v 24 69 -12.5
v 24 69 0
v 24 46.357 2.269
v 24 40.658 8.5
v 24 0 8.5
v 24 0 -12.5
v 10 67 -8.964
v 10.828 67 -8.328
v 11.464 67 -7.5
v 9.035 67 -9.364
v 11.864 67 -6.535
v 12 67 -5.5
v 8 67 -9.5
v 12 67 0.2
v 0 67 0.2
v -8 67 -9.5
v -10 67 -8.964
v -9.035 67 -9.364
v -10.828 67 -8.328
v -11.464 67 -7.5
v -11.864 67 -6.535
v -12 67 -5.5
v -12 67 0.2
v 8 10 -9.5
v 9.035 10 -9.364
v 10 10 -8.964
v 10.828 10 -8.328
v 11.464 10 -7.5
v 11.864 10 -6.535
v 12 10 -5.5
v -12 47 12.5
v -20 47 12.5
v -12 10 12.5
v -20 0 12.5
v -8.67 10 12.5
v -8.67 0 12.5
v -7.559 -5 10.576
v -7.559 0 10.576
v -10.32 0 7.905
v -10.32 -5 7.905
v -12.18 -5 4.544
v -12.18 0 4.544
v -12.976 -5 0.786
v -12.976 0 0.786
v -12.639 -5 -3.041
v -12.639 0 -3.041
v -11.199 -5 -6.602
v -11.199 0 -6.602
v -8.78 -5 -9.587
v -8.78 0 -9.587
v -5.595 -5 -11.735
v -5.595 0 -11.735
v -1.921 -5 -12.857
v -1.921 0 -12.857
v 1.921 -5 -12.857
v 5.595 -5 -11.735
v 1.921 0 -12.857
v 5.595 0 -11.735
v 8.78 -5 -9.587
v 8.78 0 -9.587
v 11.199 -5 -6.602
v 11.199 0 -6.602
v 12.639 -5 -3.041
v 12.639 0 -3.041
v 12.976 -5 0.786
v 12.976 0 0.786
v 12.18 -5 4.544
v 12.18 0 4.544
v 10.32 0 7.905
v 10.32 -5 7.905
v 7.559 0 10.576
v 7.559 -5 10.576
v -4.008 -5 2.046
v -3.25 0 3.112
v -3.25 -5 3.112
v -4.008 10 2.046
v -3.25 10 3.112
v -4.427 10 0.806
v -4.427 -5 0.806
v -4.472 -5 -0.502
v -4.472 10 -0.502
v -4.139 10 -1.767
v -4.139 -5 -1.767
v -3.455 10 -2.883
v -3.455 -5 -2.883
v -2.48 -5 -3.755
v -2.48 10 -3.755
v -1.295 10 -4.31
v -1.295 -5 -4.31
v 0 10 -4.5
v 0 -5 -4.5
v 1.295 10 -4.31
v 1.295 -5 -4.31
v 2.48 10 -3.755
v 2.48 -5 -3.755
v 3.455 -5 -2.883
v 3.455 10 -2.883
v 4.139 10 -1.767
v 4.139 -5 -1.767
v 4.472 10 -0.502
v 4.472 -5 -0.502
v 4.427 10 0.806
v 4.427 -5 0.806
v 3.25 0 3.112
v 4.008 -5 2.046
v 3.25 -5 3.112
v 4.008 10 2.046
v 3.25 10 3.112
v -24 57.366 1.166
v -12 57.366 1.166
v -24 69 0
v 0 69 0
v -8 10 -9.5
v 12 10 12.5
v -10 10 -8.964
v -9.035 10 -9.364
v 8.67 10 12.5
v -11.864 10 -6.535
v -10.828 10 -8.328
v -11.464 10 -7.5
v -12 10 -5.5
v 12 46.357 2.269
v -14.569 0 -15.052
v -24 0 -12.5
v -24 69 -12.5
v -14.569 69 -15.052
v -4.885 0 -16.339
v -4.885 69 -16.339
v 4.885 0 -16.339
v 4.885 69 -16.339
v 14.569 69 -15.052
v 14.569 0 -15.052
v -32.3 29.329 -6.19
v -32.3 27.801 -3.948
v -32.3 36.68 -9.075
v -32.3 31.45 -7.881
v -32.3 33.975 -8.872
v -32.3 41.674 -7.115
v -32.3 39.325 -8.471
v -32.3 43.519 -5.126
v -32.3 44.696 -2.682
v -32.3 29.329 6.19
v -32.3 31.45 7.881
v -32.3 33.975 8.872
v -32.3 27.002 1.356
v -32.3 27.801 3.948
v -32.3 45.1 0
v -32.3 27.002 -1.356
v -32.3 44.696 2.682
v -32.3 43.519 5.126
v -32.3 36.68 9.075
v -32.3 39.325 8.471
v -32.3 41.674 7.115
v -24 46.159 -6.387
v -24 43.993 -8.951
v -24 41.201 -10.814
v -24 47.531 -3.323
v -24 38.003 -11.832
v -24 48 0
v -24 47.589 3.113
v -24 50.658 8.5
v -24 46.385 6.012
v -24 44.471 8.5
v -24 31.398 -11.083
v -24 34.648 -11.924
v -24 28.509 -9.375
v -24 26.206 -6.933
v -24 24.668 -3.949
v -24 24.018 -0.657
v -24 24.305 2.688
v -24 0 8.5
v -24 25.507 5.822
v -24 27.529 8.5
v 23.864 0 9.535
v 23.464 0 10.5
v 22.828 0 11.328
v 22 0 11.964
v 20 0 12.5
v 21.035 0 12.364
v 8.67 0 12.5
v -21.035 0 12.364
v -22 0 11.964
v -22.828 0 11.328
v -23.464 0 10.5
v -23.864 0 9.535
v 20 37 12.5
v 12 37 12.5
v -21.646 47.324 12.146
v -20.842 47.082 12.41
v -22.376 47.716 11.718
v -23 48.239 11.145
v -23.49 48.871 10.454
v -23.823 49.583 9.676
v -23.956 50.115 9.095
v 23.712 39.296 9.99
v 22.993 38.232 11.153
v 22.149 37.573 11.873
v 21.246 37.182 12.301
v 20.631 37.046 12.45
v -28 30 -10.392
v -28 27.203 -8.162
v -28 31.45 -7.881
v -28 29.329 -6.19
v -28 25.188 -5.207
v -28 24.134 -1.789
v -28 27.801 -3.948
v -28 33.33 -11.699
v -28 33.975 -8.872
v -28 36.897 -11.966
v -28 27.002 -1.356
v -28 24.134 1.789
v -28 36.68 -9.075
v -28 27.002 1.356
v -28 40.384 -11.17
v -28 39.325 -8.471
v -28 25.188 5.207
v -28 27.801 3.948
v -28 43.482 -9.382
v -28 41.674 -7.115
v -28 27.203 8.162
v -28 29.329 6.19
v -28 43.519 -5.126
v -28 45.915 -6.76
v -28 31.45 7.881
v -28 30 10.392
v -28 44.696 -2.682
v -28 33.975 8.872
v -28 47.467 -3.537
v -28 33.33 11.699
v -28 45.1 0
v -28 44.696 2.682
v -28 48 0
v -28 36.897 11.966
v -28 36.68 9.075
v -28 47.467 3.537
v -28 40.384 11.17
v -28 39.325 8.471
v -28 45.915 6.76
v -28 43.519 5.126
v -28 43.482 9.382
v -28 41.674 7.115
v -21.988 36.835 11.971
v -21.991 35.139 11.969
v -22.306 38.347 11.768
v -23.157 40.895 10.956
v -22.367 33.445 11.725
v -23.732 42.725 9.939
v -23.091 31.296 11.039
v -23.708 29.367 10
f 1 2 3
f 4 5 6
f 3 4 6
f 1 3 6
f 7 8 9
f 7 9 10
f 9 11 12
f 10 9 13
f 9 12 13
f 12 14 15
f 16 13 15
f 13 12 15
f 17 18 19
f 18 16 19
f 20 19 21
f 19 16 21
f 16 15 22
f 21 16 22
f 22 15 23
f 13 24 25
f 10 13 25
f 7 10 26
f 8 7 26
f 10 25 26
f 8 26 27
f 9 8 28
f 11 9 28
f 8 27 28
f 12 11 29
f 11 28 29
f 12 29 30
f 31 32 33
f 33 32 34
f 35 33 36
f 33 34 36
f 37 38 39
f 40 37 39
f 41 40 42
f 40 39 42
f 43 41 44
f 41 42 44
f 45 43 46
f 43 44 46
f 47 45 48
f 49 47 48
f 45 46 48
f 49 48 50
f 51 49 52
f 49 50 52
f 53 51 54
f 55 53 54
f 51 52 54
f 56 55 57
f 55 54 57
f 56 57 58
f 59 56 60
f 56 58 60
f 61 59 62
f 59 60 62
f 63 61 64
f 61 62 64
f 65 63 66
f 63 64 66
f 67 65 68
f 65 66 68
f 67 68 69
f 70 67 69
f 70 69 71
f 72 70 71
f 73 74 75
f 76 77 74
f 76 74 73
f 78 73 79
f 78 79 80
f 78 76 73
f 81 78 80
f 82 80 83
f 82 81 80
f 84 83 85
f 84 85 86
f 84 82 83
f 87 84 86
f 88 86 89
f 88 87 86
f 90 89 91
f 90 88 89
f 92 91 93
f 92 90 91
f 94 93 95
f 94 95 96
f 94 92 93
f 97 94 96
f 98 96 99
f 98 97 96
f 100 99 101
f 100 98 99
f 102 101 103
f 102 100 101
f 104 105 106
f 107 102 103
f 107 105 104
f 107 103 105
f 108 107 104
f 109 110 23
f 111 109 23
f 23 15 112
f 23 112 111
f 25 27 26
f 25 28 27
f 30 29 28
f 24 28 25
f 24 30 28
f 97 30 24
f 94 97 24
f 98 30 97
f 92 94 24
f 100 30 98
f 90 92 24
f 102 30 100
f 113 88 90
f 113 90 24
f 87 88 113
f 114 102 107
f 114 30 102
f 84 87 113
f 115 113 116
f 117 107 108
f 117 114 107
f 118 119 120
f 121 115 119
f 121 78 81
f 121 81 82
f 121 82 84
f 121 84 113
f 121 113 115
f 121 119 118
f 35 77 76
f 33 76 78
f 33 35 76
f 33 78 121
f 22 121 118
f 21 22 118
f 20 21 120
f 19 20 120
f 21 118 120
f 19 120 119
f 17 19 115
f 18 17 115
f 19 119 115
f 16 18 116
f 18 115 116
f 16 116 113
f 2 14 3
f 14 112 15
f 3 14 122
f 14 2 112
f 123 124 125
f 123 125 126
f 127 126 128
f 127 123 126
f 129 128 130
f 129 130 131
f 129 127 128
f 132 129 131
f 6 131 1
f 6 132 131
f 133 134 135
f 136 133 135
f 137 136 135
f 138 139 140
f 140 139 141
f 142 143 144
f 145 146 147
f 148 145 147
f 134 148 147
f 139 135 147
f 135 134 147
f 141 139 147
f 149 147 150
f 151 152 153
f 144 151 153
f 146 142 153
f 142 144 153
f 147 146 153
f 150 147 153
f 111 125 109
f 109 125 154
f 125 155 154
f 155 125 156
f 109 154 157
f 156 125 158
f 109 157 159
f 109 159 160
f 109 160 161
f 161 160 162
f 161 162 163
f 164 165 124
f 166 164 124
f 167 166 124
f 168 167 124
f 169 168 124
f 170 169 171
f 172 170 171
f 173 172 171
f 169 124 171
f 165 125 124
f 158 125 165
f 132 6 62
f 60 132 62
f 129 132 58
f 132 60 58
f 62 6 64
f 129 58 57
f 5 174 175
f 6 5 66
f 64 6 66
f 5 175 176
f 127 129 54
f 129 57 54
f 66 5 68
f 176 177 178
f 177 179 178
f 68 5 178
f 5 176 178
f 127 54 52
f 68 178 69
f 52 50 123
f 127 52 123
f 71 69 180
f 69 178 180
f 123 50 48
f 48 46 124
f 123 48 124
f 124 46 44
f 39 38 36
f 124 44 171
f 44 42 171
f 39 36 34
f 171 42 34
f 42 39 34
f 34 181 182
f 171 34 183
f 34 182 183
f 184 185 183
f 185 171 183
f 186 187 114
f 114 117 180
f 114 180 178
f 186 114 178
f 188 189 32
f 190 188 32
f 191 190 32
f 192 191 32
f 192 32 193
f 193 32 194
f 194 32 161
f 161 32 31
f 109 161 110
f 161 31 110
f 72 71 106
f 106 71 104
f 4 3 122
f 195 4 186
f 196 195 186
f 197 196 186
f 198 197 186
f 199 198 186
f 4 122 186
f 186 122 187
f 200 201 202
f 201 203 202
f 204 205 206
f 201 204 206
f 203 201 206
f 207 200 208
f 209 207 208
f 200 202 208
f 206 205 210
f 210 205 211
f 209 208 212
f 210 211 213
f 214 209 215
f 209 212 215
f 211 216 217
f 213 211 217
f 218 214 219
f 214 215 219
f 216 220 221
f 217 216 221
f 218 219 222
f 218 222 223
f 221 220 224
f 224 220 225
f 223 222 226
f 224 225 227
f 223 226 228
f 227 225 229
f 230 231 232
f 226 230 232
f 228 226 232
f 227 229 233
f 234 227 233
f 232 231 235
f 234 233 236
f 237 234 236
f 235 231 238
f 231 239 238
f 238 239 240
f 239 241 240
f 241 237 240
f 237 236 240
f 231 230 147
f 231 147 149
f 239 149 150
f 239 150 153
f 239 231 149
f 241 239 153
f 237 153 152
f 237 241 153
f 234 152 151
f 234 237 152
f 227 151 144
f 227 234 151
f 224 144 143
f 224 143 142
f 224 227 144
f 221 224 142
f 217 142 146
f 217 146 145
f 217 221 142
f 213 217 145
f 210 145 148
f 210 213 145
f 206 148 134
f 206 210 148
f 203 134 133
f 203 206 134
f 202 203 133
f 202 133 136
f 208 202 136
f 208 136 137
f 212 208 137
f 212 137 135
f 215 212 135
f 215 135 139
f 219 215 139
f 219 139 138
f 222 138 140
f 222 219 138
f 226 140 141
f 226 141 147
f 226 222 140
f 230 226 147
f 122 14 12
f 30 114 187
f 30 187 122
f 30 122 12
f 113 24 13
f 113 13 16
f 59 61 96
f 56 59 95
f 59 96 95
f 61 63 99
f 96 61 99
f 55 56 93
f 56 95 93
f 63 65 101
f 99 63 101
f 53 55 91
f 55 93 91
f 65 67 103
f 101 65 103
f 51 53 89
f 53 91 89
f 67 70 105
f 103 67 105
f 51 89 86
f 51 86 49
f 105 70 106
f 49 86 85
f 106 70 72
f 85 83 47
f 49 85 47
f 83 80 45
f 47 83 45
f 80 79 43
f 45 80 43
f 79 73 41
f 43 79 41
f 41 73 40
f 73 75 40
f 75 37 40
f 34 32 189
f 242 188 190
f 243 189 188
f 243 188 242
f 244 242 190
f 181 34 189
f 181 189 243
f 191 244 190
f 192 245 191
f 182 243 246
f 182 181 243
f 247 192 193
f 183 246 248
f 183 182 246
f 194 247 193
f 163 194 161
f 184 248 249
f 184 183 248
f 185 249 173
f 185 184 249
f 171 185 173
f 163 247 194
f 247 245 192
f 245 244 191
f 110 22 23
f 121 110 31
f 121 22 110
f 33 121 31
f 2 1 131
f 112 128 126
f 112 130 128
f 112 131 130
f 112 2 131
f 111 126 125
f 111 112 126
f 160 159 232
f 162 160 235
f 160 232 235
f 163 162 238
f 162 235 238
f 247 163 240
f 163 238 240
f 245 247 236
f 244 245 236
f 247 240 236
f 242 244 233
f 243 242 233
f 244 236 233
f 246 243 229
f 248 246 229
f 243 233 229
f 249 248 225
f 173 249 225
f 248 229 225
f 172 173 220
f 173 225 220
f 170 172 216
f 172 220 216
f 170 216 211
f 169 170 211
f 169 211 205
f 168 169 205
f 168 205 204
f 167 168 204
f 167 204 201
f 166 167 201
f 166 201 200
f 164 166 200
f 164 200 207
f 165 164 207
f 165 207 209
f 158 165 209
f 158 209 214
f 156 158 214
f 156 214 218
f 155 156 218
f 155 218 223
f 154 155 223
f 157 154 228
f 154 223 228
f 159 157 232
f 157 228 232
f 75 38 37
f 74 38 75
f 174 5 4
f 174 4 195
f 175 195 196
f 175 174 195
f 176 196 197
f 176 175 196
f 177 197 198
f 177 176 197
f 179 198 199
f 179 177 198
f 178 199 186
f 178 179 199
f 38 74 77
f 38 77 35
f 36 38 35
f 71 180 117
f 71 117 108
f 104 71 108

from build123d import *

# Parameters (mm, degrees)
PAD_DEPTH       = 69
POCKET_DEPTH    = 57
POCKET001_DEPTH = 10
PAD001_DEPTH    = 5
POCKET002_DEPTH = 24.001
POCKET003_DEPTH = 24.001
SKETCH006_R     = 12
PAD002_DEPTH    = 10
SKETCH007_R     = 9.1
PAD003_DEPTH    = 4.3


with BuildPart() as part:
    # Sketch → Pad (new body)
    with BuildSketch(Plane.XZ):
        with BuildLine():
            Line((-24, -12.5), (-24, 8.5))
            ThreePointArc((-20, 12.5), (-22.828427, 11.328427), (-24, 8.5))
            Line((-20, 12.5), (20, 12.5))
            ThreePointArc((24, 8.5), (22.828427, 11.328427), (20, 12.5))
            Line((24, 8.5), (24, -12.5))
            ThreePointArc((-24, -12.5), (0, -16.5), (24, -12.5))
        make_face()
    extrude(amount=-PAD_DEPTH)

    # Sketch001 → Pocket (cut)
    with BuildSketch(Plane.XZ.offset(-10)):
        with BuildLine():
            Line((-12, -5.5), (-12, 12.5))
            Line((-12, 12.5), (12, 12.5))
            Line((12, 12.5), (12, -5.5))
            ThreePointArc((8, -9.5), (10.828427, -8.328427), (12, -5.5))
            Line((8, -9.5), (-8, -9.5))
            ThreePointArc((-12, -5.5), (-10.828427, -8.328427), (-8, -9.5))
        make_face()
    extrude(amount=-POCKET_DEPTH, mode=Mode.SUBTRACT)

    # Sketch002 → Pocket001 (cut)
    with BuildSketch(Plane.XZ):
        with BuildLine():
            ThreePointArc((-3.25, 3.112475), (0, -4.5), (3.25, 3.112475))
            Line((8.66989, 12.5), (3.25, 3.112475))
            Line((-8.66989, 12.5), (8.66989, 12.5))
            Line((-3.25, 3.112475), (-8.66989, 12.5))
        make_face()
    extrude(amount=-POCKET001_DEPTH, mode=Mode.SUBTRACT)

    # Sketch003 → Pad001 (join)
    with BuildSketch(Plane.XZ):
        with BuildLine():
            ThreePointArc((-3.25, 3.112475), (0, -4.5), (3.25, 3.112475))
            Line((7.559237, 10.576292), (3.25, 3.112475))
            ThreePointArc((-7.559237, 10.576292), (0, -13), (7.559237, 10.576292))
            Line((-7.559237, 10.576292), (-3.25, 3.112475))
        make_face()
    extrude(amount=PAD001_DEPTH)

    # Sketch004 → Pocket002 (cut, through all)
    with BuildSketch(Plane.YZ):
        Polygon((69, 12.5), (69, 0), (46.356987, 2.26935), (37, 12.5), align=None)
    extrude(amount=POCKET002_DEPTH, mode=Mode.SUBTRACT)

    # Sketch005 → Pocket003 (cut, through all)
    with BuildSketch(Plane.YZ):
        Polygon((47, 12.5), (57.366132, 1.165981), (69, 0), (69, 12.5), align=None)
    extrude(amount=-POCKET003_DEPTH, mode=Mode.SUBTRACT)

    # Sketch006 → Pad002 (join)
    with BuildSketch(Plane.YZ.offset(-28)):
        with Locations((36, 0)):
            Circle(SKETCH006_R)
    extrude(amount=PAD002_DEPTH)

    # Sketch007 → Pad003 (join)
    with BuildSketch(Plane.YZ.offset(-28)):
        with Locations((36, 0)):
            Circle(SKETCH007_R)
    extrude(amount=-PAD003_DEPTH)


solid = part.part
